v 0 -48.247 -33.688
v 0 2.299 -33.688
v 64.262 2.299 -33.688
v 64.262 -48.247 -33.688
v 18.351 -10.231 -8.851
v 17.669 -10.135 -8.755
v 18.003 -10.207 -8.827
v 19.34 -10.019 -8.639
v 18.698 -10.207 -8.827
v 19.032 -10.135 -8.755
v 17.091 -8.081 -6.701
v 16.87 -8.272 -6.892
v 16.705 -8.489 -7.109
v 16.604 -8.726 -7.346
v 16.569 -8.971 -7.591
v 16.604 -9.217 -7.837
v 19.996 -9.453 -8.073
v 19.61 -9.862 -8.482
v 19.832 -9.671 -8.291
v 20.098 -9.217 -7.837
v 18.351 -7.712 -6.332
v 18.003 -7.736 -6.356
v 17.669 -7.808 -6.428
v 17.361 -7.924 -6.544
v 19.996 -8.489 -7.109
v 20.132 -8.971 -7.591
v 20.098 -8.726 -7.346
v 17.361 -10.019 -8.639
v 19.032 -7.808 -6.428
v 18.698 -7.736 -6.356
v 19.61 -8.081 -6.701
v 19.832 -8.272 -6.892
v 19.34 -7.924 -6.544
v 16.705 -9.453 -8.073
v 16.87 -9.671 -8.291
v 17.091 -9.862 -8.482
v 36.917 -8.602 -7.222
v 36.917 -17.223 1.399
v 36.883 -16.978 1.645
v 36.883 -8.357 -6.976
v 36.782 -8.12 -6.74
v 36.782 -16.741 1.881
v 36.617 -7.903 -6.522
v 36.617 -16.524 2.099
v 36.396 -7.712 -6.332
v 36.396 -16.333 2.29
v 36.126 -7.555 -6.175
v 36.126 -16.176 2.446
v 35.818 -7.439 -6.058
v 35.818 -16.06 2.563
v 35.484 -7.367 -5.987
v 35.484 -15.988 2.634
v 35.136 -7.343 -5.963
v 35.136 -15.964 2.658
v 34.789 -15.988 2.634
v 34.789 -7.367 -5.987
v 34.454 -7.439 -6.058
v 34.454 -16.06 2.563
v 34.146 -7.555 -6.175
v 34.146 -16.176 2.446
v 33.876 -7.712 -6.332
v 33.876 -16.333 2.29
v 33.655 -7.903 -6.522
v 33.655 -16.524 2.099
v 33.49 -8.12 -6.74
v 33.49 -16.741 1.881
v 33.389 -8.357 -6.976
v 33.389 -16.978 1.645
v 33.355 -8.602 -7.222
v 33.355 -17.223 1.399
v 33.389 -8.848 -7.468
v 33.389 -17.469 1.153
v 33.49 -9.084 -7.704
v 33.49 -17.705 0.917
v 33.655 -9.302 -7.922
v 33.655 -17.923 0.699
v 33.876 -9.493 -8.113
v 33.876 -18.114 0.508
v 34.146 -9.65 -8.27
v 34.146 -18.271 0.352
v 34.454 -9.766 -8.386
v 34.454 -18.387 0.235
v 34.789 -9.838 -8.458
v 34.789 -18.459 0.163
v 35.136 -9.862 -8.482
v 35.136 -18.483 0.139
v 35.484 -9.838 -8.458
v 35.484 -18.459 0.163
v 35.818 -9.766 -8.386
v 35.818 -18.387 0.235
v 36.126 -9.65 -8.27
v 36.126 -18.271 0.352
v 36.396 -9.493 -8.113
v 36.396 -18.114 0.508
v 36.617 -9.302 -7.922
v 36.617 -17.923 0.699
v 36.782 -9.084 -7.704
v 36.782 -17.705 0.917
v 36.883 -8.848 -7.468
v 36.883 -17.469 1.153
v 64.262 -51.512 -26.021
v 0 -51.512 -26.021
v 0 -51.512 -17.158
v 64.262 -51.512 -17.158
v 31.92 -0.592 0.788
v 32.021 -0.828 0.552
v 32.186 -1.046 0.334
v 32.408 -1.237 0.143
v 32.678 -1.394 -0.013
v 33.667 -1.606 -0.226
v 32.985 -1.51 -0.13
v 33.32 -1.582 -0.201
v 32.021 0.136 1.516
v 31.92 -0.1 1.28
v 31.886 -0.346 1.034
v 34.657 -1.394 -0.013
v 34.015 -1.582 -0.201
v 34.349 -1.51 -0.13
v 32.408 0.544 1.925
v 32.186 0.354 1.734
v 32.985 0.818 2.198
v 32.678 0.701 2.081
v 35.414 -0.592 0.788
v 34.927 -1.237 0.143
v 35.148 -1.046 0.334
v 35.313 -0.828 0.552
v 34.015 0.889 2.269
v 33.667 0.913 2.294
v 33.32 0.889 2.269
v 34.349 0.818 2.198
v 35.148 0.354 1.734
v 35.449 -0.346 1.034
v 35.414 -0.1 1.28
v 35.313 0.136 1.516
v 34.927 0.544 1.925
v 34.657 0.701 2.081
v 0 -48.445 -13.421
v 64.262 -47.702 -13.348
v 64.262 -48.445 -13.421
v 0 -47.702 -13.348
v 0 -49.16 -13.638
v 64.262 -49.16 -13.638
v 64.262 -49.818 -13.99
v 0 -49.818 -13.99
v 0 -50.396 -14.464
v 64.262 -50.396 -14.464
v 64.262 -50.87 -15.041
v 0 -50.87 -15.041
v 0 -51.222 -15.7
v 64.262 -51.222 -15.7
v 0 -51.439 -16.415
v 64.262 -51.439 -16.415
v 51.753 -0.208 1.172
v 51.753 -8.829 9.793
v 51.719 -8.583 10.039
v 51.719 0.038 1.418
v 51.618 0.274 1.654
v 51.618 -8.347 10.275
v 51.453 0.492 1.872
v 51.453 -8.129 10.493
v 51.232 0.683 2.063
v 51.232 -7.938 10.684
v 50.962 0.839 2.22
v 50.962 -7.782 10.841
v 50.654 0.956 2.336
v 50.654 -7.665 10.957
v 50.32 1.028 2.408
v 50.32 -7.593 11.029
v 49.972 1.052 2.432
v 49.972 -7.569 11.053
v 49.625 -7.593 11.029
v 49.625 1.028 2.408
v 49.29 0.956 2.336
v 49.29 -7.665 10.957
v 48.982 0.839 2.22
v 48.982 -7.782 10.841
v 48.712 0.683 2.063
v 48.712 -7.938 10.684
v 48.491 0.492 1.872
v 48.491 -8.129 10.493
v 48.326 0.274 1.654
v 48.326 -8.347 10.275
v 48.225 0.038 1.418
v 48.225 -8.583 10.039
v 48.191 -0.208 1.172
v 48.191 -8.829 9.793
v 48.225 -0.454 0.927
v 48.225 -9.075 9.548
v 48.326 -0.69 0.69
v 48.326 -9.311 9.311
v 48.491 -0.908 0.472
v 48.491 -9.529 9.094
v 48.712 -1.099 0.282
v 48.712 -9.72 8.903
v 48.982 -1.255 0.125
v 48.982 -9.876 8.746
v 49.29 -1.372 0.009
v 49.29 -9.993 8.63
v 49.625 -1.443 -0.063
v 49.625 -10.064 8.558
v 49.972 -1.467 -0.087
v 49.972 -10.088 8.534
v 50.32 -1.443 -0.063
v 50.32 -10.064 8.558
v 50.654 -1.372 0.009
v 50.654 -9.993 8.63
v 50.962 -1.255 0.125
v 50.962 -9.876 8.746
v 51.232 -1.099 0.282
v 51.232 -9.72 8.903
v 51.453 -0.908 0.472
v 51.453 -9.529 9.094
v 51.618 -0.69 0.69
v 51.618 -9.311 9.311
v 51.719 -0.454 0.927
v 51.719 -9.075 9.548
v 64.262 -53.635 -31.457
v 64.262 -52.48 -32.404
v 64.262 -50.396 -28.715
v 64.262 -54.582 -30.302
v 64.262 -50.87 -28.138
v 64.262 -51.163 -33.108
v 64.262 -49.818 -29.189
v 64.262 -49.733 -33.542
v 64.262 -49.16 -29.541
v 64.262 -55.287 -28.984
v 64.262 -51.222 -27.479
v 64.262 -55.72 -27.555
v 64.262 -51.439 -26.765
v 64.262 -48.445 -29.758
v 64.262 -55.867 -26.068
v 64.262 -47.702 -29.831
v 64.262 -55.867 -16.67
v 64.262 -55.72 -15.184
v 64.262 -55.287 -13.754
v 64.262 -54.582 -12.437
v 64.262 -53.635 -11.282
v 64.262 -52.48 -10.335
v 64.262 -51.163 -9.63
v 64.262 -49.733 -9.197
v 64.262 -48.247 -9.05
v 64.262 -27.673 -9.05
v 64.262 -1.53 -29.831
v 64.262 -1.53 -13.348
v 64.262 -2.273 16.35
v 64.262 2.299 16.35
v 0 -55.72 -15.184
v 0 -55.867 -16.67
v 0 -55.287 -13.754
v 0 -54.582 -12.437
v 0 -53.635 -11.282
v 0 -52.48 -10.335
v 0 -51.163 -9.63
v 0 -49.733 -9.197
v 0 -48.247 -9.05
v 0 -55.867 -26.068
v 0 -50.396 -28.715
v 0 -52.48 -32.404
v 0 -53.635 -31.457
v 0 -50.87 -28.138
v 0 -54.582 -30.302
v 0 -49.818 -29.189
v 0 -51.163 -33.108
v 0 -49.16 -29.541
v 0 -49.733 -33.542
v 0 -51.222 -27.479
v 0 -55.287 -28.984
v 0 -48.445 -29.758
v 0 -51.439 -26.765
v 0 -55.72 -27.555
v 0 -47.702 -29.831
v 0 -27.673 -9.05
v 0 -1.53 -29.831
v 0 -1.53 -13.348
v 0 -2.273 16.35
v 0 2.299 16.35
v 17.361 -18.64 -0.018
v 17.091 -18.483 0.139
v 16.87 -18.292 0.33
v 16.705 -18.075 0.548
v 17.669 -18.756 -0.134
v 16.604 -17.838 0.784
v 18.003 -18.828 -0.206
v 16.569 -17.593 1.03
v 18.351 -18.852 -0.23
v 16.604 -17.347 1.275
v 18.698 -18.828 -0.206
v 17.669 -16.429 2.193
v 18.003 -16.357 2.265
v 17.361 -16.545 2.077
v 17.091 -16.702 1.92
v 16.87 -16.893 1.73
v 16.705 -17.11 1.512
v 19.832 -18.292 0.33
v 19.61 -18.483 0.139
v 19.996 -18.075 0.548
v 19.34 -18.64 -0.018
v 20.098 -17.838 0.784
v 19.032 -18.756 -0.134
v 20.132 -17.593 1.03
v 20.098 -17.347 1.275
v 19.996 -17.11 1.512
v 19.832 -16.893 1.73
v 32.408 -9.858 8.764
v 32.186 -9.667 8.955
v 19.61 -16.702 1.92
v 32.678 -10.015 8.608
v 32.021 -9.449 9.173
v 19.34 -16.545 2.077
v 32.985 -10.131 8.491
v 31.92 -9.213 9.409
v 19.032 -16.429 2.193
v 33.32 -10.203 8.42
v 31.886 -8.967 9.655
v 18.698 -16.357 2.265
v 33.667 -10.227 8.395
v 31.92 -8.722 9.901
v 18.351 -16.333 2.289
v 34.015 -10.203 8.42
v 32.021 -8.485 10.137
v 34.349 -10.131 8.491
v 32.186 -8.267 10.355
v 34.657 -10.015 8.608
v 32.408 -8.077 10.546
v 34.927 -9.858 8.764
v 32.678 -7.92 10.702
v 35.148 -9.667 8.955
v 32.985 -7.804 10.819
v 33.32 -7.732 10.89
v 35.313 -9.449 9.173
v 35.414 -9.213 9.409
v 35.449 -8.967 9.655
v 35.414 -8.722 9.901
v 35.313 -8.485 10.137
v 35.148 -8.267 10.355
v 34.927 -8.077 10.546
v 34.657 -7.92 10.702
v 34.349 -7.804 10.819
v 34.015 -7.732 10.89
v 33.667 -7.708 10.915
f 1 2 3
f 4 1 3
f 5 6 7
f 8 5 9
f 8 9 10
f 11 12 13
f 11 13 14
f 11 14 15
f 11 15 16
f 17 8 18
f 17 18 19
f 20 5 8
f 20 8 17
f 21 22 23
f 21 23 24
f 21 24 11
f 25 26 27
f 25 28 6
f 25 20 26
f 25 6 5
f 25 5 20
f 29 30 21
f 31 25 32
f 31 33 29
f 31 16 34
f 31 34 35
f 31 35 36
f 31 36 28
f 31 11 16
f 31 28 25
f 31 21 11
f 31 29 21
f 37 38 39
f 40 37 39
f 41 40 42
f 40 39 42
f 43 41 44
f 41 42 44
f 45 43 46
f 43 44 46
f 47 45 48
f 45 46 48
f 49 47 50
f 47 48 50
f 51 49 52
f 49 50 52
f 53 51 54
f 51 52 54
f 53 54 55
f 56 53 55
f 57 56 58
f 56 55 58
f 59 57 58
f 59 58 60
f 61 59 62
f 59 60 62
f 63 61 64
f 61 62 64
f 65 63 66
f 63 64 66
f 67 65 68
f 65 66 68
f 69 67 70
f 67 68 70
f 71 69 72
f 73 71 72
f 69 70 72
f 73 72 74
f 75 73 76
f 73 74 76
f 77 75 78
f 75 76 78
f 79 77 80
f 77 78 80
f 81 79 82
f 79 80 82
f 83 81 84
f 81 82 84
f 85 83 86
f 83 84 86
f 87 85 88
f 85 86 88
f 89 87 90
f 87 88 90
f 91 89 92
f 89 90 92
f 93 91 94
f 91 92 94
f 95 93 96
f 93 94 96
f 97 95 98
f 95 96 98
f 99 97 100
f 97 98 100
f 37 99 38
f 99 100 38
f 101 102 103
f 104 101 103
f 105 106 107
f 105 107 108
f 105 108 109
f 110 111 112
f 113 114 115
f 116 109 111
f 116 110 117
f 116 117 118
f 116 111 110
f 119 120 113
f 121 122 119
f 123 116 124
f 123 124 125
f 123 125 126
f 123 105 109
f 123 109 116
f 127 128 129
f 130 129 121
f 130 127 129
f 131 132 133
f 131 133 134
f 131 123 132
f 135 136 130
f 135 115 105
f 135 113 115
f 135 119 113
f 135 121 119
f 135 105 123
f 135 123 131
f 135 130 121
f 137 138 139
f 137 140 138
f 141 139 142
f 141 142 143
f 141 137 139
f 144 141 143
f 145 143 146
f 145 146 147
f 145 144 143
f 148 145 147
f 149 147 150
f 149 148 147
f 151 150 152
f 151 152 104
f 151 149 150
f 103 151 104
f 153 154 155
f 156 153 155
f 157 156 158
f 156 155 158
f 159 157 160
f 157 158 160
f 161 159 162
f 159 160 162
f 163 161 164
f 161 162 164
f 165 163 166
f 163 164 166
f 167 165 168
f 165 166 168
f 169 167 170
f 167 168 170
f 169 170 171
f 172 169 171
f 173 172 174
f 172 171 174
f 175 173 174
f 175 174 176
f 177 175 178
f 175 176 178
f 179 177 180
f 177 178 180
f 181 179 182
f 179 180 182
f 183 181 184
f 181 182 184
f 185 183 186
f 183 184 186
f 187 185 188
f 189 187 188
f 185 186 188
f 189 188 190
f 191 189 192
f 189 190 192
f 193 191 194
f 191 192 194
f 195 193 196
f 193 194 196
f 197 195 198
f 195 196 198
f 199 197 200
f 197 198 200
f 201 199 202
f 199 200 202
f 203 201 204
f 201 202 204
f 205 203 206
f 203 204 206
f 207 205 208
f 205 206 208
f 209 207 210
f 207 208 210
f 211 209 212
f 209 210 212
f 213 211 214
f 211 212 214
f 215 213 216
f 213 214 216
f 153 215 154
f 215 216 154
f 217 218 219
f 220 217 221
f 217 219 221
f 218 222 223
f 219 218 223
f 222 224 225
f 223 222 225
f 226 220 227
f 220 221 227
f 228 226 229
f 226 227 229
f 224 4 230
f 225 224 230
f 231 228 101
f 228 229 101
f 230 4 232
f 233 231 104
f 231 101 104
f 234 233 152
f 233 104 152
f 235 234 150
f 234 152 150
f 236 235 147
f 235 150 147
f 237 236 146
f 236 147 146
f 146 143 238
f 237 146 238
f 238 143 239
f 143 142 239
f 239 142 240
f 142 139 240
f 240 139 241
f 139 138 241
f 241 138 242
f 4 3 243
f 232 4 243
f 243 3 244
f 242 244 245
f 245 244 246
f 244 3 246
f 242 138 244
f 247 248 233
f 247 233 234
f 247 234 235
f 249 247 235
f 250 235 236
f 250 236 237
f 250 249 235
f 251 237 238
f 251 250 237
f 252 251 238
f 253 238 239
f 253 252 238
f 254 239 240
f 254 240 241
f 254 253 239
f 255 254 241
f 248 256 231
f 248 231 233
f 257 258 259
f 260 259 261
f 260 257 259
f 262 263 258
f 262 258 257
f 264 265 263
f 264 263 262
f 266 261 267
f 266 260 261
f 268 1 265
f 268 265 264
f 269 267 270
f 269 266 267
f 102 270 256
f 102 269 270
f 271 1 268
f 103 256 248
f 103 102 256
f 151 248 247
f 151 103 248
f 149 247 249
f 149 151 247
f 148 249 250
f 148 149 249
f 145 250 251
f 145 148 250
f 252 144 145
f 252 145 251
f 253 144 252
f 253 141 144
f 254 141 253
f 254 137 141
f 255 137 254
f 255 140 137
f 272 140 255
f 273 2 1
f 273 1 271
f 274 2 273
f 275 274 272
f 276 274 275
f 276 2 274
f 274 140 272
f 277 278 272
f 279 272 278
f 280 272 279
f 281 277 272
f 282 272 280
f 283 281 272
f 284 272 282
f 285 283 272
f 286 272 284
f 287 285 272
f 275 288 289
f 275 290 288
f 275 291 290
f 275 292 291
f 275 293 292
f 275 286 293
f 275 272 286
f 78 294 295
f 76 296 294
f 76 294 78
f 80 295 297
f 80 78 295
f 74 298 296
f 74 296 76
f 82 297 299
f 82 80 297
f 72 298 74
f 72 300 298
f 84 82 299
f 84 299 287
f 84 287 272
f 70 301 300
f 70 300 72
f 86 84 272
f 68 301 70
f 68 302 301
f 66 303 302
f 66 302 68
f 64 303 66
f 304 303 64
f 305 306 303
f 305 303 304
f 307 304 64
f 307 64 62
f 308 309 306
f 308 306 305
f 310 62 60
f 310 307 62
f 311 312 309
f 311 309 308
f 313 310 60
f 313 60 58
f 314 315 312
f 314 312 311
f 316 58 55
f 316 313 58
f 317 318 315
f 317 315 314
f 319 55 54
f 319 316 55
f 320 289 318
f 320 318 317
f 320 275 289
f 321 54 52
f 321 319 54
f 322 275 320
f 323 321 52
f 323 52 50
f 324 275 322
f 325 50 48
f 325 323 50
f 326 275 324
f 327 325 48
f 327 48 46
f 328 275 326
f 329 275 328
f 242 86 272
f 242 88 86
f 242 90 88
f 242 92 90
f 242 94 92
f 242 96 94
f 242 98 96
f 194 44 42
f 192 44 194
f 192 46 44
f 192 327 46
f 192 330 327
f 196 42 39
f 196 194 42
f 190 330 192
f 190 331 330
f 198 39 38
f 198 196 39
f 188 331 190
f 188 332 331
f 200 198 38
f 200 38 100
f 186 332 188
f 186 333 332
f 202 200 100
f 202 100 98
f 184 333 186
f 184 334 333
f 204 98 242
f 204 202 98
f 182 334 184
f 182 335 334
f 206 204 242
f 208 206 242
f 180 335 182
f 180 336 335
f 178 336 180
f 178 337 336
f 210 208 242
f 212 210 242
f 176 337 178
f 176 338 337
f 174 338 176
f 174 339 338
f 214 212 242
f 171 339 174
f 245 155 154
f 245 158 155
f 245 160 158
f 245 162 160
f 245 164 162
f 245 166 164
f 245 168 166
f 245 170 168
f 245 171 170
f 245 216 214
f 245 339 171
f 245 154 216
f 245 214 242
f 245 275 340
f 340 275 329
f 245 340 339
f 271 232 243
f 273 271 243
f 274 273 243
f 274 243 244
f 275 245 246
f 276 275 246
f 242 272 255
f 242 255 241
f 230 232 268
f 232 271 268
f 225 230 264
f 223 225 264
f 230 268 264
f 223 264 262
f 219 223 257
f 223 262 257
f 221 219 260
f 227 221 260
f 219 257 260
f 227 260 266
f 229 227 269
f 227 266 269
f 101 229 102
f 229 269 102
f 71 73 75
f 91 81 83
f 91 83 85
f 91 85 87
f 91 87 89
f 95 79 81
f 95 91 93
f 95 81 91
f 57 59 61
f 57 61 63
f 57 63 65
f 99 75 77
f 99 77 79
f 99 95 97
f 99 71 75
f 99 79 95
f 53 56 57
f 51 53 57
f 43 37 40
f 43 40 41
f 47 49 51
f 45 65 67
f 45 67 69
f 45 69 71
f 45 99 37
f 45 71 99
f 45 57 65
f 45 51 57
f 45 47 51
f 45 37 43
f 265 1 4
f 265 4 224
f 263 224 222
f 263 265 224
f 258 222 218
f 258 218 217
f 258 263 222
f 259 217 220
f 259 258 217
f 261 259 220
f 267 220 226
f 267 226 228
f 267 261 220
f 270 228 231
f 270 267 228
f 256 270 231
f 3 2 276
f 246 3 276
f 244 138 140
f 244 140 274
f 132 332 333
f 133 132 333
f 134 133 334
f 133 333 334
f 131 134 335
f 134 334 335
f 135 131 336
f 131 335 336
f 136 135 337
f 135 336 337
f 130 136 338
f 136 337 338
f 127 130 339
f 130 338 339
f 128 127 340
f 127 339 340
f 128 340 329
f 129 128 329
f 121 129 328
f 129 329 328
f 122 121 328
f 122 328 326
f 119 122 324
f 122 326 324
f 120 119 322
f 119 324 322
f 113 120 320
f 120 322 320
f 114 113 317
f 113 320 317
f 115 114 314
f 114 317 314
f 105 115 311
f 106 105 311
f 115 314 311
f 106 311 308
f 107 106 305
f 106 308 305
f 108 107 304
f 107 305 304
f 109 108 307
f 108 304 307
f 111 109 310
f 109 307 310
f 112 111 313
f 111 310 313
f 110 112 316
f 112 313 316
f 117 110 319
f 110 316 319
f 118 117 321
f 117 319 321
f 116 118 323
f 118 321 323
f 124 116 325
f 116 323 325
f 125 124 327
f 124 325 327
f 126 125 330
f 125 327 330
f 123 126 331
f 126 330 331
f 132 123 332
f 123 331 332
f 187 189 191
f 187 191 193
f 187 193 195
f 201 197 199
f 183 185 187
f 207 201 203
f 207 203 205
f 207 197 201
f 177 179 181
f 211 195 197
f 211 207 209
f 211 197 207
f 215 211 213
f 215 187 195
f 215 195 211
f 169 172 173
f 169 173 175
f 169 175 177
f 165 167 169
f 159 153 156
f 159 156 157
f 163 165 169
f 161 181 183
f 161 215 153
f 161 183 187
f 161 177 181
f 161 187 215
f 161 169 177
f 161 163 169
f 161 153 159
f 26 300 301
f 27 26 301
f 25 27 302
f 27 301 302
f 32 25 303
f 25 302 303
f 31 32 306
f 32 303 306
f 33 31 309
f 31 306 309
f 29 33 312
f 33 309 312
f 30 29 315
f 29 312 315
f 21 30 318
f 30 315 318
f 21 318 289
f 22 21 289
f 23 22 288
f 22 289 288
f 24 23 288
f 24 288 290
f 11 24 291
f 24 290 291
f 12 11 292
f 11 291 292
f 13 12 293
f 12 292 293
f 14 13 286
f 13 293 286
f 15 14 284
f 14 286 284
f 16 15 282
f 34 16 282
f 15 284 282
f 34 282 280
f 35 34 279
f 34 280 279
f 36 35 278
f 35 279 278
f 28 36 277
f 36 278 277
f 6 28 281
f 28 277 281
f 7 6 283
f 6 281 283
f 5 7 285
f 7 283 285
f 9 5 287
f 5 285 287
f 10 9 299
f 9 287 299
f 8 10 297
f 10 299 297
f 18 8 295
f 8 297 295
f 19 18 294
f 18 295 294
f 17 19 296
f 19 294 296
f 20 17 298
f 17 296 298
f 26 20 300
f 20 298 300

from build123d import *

# Parameters (mm, degrees)
F0_W        = 29.972
F0_H        = 50.038
F1_DEPTH    = 64.262
F2_SIZE     = 25.4
F3_DEPTH    = 28.194
F4_T1_DEPTH = 102.362
F5_R        = 1.7813508629
F6_DEPTH    = 12.192
F7_W        = 49.9822117854
F7_H        = 16.4834968746
F8_DEPTH    = 137.16
F9_R        = 3.81


# Not quite as in the source:
# - a fillet or chamfer that OpenCascade refuses, or shapes differently, is made with other operations: its cross-section is extruded or revolved along the edge and cut away or added


with BuildPart() as f1:
    # F0 (on Right) → F1 (new body)
    with BuildSketch(Plane.YZ):
        with Locations((-12.6866316661, -8.6694222925)):
            Rectangle(F0_W, F0_H)
    extrude(amount=F1_DEPTH)

    # F2
    f2_edges = [f1.edges().sort_by_distance(p)[0] for p in [
        (32.131, -27.672632, 16.349578),
    ]]
    chamfer(f2_edges, length=F2_SIZE)

    # F3 (add): a face of the model
    f3_faces = [f1.faces().sort_by_distance(p)[0] for p in [
        (32.131, -27.6726316661, -21.3694222925),
    ]]
    extrude(f3_faces, amount=F3_DEPTH)

    # F4: fillet of radius 7.62 on 4 edges, made by hand

    # F4_s2 → F4_t1 (cut)
    with BuildSketch(Plane.YZ.offset(-19.05)):
        with BuildLine():
            ThreePointArc((-48.2466316661, -33.6884222925), (-53.6347853387, -31.4565759651), (-55.8666316661, -26.0684222925))
            Line((-55.8666316661, -26.0684222925), (-55.8666316661, -33.6884222925))
            Line((-55.8666316661, -33.6884222925), (-48.2466316661, -33.6884222925))
        make_face()
        with BuildLine():
            ThreePointArc((-55.8666316661, -16.6704222925), (-53.6347853387, -11.2822686198), (-48.2466316661, -9.0504222925))
            Line((-48.2466316661, -9.0504222925), (-55.8666316661, -9.0504222925))
            Line((-55.8666316661, -9.0504222925), (-55.8666316661, -16.6704222925))
        make_face()
    extrude(amount=F4_T1_DEPTH, mode=Mode.SUBTRACT)

    # F5 (on face) → F6 (cut)
    with BuildSketch(Plane(origin=(0, -9.3111046868, 9.3111046868), x_dir=(1, 0, 0), z_dir=(0, -0.7071067812, 0.7071067812))):
        with Locations((35.1360822096, -11.1896051094)):
            Circle(F5_R)
        with Locations((49.9720936641, 0.6819777191)):
            Circle(F5_R)
        with Locations((33.6671667174, 0.486287754)):
            Circle(F5_R)
        with Locations((18.350715749, -11.7116672918)):
            Circle(F5_R)
    extrude(amount=-F6_DEPTH, mode=Mode.SUBTRACT)

    # F7 (on face) → F8 (cut)
    with BuildSketch(Plane.YZ.offset(64.262)):
        with Locations((-26.5206474578, -21.5896144509)):
            Rectangle(F7_W, F7_H)
    extrude(amount=-F8_DEPTH, mode=Mode.SUBTRACT)

    # F9
    f9_edges = [f1.edges().sort_by_distance(p)[0] for p in [
        (32.131, -51.511753, -13.347866),
        (32.131, -51.511753, -29.831363),
    ]]
    fillet(f9_edges, radius=F9_R)


solid = f1.part
